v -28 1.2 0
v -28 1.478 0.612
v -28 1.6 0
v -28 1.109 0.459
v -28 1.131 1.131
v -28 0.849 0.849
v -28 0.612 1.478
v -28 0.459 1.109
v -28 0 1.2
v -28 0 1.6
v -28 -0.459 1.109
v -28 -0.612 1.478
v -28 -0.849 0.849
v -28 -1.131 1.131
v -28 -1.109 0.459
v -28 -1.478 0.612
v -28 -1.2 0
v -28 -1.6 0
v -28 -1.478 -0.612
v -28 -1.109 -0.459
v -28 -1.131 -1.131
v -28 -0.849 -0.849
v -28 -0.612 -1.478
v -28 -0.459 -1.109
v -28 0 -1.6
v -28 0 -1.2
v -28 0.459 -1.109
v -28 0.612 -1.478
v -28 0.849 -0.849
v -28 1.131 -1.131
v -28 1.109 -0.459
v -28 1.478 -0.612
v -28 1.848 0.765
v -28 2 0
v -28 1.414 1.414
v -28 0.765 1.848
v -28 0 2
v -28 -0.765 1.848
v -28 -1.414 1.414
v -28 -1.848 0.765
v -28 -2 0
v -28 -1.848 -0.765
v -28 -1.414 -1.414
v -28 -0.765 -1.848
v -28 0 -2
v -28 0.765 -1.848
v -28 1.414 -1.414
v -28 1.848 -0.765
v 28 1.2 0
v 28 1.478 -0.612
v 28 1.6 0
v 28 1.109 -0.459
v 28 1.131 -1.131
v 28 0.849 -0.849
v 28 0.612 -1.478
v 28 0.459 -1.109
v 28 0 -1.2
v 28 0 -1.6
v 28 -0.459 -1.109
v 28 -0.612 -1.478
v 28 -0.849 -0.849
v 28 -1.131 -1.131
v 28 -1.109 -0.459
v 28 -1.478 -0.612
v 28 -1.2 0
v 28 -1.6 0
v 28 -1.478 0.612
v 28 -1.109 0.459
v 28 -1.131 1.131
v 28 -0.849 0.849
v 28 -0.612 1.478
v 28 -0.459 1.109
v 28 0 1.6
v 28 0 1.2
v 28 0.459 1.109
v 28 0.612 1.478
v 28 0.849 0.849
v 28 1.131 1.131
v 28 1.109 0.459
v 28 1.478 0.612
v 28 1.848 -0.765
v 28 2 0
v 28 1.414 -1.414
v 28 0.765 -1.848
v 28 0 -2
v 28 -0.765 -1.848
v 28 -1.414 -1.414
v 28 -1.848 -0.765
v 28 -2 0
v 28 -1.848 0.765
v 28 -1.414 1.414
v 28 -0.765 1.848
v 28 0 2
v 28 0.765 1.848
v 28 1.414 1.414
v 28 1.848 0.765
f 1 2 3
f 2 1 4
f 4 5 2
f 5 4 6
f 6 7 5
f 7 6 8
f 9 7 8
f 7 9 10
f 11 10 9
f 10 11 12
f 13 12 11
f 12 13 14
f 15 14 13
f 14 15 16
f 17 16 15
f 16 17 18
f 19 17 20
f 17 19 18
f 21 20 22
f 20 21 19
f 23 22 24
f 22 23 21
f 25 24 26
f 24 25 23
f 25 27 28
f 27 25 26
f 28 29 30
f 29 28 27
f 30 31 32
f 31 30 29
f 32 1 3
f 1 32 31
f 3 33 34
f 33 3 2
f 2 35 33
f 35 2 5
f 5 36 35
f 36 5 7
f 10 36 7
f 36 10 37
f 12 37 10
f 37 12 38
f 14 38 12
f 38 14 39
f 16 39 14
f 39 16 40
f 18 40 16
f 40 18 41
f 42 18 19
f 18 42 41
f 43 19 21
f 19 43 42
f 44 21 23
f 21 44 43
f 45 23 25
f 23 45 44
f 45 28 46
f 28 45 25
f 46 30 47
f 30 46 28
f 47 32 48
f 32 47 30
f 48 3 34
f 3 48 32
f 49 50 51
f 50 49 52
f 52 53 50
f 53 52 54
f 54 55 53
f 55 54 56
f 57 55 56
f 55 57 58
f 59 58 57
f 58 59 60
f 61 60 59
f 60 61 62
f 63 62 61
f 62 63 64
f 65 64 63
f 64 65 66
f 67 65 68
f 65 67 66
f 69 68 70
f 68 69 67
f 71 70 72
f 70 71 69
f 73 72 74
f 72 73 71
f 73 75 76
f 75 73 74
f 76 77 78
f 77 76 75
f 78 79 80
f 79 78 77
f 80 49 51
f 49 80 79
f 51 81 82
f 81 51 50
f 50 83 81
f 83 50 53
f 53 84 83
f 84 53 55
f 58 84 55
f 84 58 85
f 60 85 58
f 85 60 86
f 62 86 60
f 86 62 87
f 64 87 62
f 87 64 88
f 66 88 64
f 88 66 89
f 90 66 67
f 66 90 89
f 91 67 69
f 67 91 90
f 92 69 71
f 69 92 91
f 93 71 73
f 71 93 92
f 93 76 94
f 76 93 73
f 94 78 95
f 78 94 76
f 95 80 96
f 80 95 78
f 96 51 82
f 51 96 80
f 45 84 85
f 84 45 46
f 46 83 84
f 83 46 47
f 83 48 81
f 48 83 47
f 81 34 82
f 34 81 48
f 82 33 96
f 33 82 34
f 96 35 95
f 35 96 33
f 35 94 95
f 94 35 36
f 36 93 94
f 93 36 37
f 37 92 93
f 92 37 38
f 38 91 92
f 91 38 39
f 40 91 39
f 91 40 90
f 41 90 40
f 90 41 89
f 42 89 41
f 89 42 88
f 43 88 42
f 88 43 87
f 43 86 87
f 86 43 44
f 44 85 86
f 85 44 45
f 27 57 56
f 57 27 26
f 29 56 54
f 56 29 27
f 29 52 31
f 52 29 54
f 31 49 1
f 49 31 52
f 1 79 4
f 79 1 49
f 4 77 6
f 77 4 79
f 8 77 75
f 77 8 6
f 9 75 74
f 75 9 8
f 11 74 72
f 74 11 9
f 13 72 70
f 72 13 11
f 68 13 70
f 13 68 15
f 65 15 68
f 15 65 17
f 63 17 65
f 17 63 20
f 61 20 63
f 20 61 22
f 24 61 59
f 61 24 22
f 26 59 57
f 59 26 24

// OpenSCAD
// file: ../p/4-4disc.scad
use <../lib.scad>
$fa=1; $fs=0.2;
function ldraw_lib__4_4disc(realsolid=false) = [
// 0 Disc 1.0
// 0 Name: 4-4disc.dat
// 0 Author: James Jessiman
// 0 !LDRAW_ORG Primitive UPDATE 2002-02
// 0 !LICENSE Licensed under CC BY 2.0 and CC BY 4.0 : see CAreadme.txt
// 
// 0 BFC CERTIFY CCW
  [0,"BFC","CERTIFY"],
  [0,"BFC","CCW"],
// 
// 0 !HISTORY 1998-12-15 [PTadmin] Official Update 1998-10
// 0 !HISTORY 2002-03-23 [sbliss] Added BFC statement
// 0 !HISTORY 2002-04-25 [PTadmin] Official Update 2002-02
// 0 !HISTORY 2007-06-24 [PTadmin] Header formatted for Contributor Agreement
// 0 !HISTORY 2008-07-01 [PTadmin] Official Update 2008-01
// 
// 
// 3 16 0 0 0 1 0 0 0.9239 0 0.3827
  [3,16,0,0,0,1,0,0,0.9239,0,0.3827],
// 3 16 0 0 0 0.9239 0 0.3827 0.7071 0 0.7071
  [3,16,0,0,0,0.9239,0,0.3827,0.7071,0,0.7071],
// 3 16 0 0 0 0.7071 0 0.7071 0.3827 0 0.9239
  [3,16,0,0,0,0.7071,0,0.7071,0.3827,0,0.9239],
// 3 16 0 0 0 0.3827 0 0.9239 0 0 1
  [3,16,0,0,0,0.3827,0,0.9239,0,0,1],
// 3 16 0 0 0 0 0 1 -0.3827 0 0.9239
  [3,16,0,0,0,0,0,1,-0.3827,0,0.9239],
// 3 16 0 0 0 -0.3827 0 0.9239 -0.7071 0 0.7071
  [3,16,0,0,0,-0.3827,0,0.9239,-0.7071,0,0.7071],
// 3 16 0 0 0 -0.7071 0 0.7071 -0.9239 0 0.3827
  [3,16,0,0,0,-0.7071,0,0.7071,-0.9239,0,0.3827],
// 3 16 0 0 0 -0.9239 0 0.3827 -1 0 -0
  [3,16,0,0,0,-0.9239,0,0.3827,-1,0,-0],
// 3 16 0 0 0 -1 0 -0 -0.9239 0 -0.3827
  [3,16,0,0,0,-1,0,-0,-0.9239,0,-0.3827],
// 3 16 0 0 0 -0.9239 0 -0.3827 -0.7071 0 -0.7071
  [3,16,0,0,0,-0.9239,0,-0.3827,-0.7071,0,-0.7071],
// 3 16 0 0 0 -0.7071 0 -0.7071 -0.3827 0 -0.9239
  [3,16,0,0,0,-0.7071,0,-0.7071,-0.3827,0,-0.9239],
// 3 16 0 0 0 -0.3827 0 -0.9239 0 0 -1
  [3,16,0,0,0,-0.3827,0,-0.9239,0,0,-1],
// 3 16 0 0 0 0 0 -1 0.3827 0 -0.9239
  [3,16,0,0,0,0,0,-1,0.3827,0,-0.9239],
// 3 16 0 0 0 0.3827 0 -0.9239 0.7071 0 -0.7071
  [3,16,0,0,0,0.3827,0,-0.9239,0.7071,0,-0.7071],
// 3 16 0 0 0 0.7071 0 -0.7071 0.9239 0 -0.3827
  [3,16,0,0,0,0.7071,0,-0.7071,0.9239,0,-0.3827],
// 3 16 0 0 0 0.9239 0 -0.3827 1 0 0
  [3,16,0,0,0,0.9239,0,-0.3827,1,0,0],
// 0
];
module ldraw_lib__4_4disc(step=0, col=false, unit=2/5, alt=false, line=0.2, solid=!$preview)
    makepoly(ldraw_lib__4_4disc(solid), step=step, col=col, unit=unit, alt=alt, line=line, solid=solid);
ldraw_lib__4_4disc(line=0.2);
// file: ../p/stud3.scad
use <../lib.scad>
use <4-4cyli.scad>
use <4-4disc.scad>
use <4-4edge.scad>
$fa=1; $fs=0.2;
function ldraw_lib__stud3(realsolid=false) = realsolid ? 
    [openscad(translate([0,0,-eps()], o=cylinder(4+eps(), r=4)),2)] : [
// 0 Stud Tube Solid
// 0 Name: stud3.dat
// 0 Author: James Jessiman
// 0 !LDRAW_ORG Primitive UPDATE 2012-01
// 0 !LICENSE Licensed under CC BY 2.0 and CC BY 4.0 : see CAreadme.txt
// 
// 0 BFC CERTIFY CCW
  [0,"BFC","CERTIFY"],
  [0,"BFC","CCW"],
// 
// 0 !HISTORY 2002-04-04 [sbliss] Modified for BFC compliance
// 0 !HISTORY 2002-04-25 [PTadmin] Official Update 2002-02
// 0 !HISTORY 2007-06-24 [PTadmin] Header formatted for Contributor Agreement
// 0 !HISTORY 2008-07-01 [PTadmin] Official Update 2008-01
// 0 !HISTORY 2012-02-16 [Philo] Changed to CCW
// 0 !HISTORY 2012-03-30 [PTadmin] Official Update 2012-01
// 
// 
// 1 16 0 -4 0 4 0 0 0 1 0 0 0 4 4-4edge.dat
  [1,16,0,-4,0,4,0,0,0,1,0,0,0,4, ldraw_lib__4_4edge(realsolid)],
// 1 16 0 0 0 4 0 0 0 1 0 0 0 4 4-4edge.dat
  [1,16,0,0,0,4,0,0,0,1,0,0,0,4, ldraw_lib__4_4edge(realsolid)],
// 1 16 0 -4 0 4 0 0 0 1 0 0 0 4 4-4disc.dat
  [1,16,0,-4,0,4,0,0,0,1,0,0,0,4, ldraw_lib__4_4disc(realsolid)],
// 1 16 0 -4 0 4 0 0 0 4 0 0 0 4 4-4cyli.dat
  [1,16,0,-4,0,4,0,0,0,4,0,0,0,4, ldraw_lib__4_4cyli(realsolid)],
];
module ldraw_lib__stud3(step=0, col=false, unit=2/5, alt=false, line=0.2, solid=!$preview)
    makepoly(ldraw_lib__stud3(solid), step=step, col=col, unit=unit, alt=alt, line=line, solid=solid);
ldraw_lib__stud3(line=0.2);
// file: ../p/stud.scad
use <../lib.scad>
use <4-4cyli.scad>
use <4-4disc.scad>
use <4-4edge.scad>
$fa=1; $fs=0.2;
function ldraw_lib__stud(realsolid=false) = realsolid ? 
    [openscad(translate([0,0,-eps()], o=cylinder(4+eps(), r=6)),2)] : [
// 0 Stud
// 0 Name: stud.dat
// 0 Author: James Jessiman
// 0 !LDRAW_ORG Primitive UPDATE 2012-01
// 0 !LICENSE Licensed under CC BY 2.0 and CC BY 4.0 : see CAreadme.txt
// 
// 0 BFC CERTIFY CCW
  [0,"BFC","CERTIFY"],
  [0,"BFC","CCW"],
// 
// 0 !HISTORY 2002-04-04 [sbliss] Modified for BFC compliance
// 0 !HISTORY 2002-04-25 [PTadmin] Official Update 2002-02
// 0 !HISTORY 2007-06-24 [PTadmin] Header formatted for Contributor Agreement
// 0 !HISTORY 2008-07-01 [PTadmin] Official Update 2008-01
// 0 !HISTORY 2012-02-16 [Philo] Changed to CCW
// 0 !HISTORY 2012-03-30 [PTadmin] Official Update 2012-01
// 
// 
// 1 16 0 0 0 6 0 0 0 1 0 0 0 6 4-4edge.dat
  [1,16,0,0,0,6,0,0,0,1,0,0,0,6, ldraw_lib__4_4edge(realsolid)],
// 1 16 0 -4 0 6 0 0 0 1 0 0 0 6 4-4edge.dat
  [1,16,0,-4,0,6,0,0,0,1,0,0,0,6, ldraw_lib__4_4edge(realsolid)],
// 1 16 0 0 0 6 0 0 0 -4 0 0 0 6 4-4cyli.dat
  [1,16,0,0,0,6,0,0,0,-4,0,0,0,6, ldraw_lib__4_4cyli(realsolid)],
// 1 16 0 -4 0 6 0 0 0 1 0 0 0 6 4-4disc.dat
  [1,16,0,-4,0,6,0,0,0,1,0,0,0,6, ldraw_lib__4_4disc(realsolid)],
];
module ldraw_lib__stud(step=0, col=false, unit=2/5, alt=false, line=0.2, solid=!$preview)
    makepoly(ldraw_lib__stud(solid), step=step, col=col, unit=unit, alt=alt, line=line, solid=solid);
ldraw_lib__stud(line=0.2);
// file: ../p/box5.scad
use <../lib.scad>
$fa=1; $fs=0.2;
function ldraw_lib__box5(realsolid=false) = [
// 0 Box with 5 Faces and All Edges
// 0 Name: box5.dat
// 0 Author: James Jessiman
// 0 !LDRAW_ORG Primitive UPDATE 2012-01
// 0 !LICENSE Licensed under CC BY 2.0 and CC BY 4.0 : see CAreadme.txt
// 
// 0 BFC CERTIFY CCW
  [0,"BFC","CERTIFY"],
  [0,"BFC","CCW"],
// 
// 0 !HISTORY 2002-04-03 [sbliss] Modified for BFC compliance
// 0 !HISTORY 2002-04-25 [PTadmin] Official Update 2002-02
// 0 !HISTORY 2007-06-24 [PTadmin] Header formatted for Contributor Agreement
// 0 !HISTORY 2008-07-01 [PTadmin] Official Update 2008-01
// 0 !HISTORY 2012-02-16 [Philo] Changed to CCW
// 0 !HISTORY 2012-03-30 [PTadmin] Official Update 2012-01
// 
// 
// 2 24 1 1 1 -1 1 1
  [2,24,1,1,1,-1,1,1],
// 2 24 -1 1 1 -1 1 -1
  [2,24,-1,1,1,-1,1,-1],
// 2 24 -1 1 -1 1 1 -1
  [2,24,-1,1,-1,1,1,-1],
// 2 24 1 1 -1 1 1 1
  [2,24,1,1,-1,1,1,1],
// 2 24 1 0 1 -1 0 1
  [2,24,1,0,1,-1,0,1],
// 2 24 -1 0 1 -1 0 -1
  [2,24,-1,0,1,-1,0,-1],
// 2 24 -1 0 -1 1 0 -1
  [2,24,-1,0,-1,1,0,-1],
// 2 24 1 0 -1 1 0 1
  [2,24,1,0,-1,1,0,1],
// 2 24 1 0 1 1 1 1
  [2,24,1,0,1,1,1,1],
// 2 24 -1 0 1 -1 1 1
  [2,24,-1,0,1,-1,1,1],
// 2 24 1 0 -1 1 1 -1
  [2,24,1,0,-1,1,1,-1],
// 2 24 -1 0 -1 -1 1 -1
  [2,24,-1,0,-1,-1,1,-1],
// 4 16 -1 1 1 1 1 1 1 1 -1 -1 1 -1
  [4,16,-1,1,1,1,1,1,1,1,-1,-1,1,-1],
// 4 16 -1 1 1 -1 0 1 1 0 1 1 1 1
  [4,16,-1,1,1,-1,0,1,1,0,1,1,1,1],
// 4 16 -1 1 -1 -1 0 -1 -1 0 1 -1 1 1
  [4,16,-1,1,-1,-1,0,-1,-1,0,1,-1,1,1],
// 4 16 1 1 -1 1 0 -1 -1 0 -1 -1 1 -1
  [4,16,1,1,-1,1,0,-1,-1,0,-1,-1,1,-1],
// 4 16 1 1 1 1 0 1 1 0 -1 1 1 -1
  [4,16,1,1,1,1,0,1,1,0,-1,1,1,-1],
];
module ldraw_lib__box5(step=0, col=false, unit=2/5, alt=false, line=0.2, solid=!$preview)
    makepoly(ldraw_lib__box5(solid), step=step, col=col, unit=unit, alt=alt, line=line, solid=solid);
ldraw_lib__box5(line=0.2);
// file: ../p/box4t.scad
use <../lib.scad>
$fa=1; $fs=0.2;
function ldraw_lib__box4t(realsolid=false) = [
// 0 Box with 4 Adjacent Faces and All Edges
// 0 Name: box4t.dat
// 0 Author: Tore Eriksson [Tore_Eriksson]
// 0 !LDRAW_ORG Primitive UPDATE 2003-02
// 0 !LICENSE Licensed under CC BY 2.0 and CC BY 4.0 : see CAreadme.txt
// 
// 0 BFC CERTIFY CCW
  [0,"BFC","CERTIFY"],
  [0,"BFC","CCW"],
// 
// 0 !HISTORY 1997-09-29 [PTadmin] Official Update 1997-15
// 0 !HISTORY 2002-08-31 [izanette] Modified with WINDZ for BFC compliance
// 0 !HISTORY 2003-08-01 [PTadmin] Official Update 2003-02
// 0 !HISTORY 2007-06-24 [PTadmin] Header formatted for Contributor Agreement
// 0 !HISTORY 2008-07-01 [PTadmin] Official Update 2008-01
// 
// 
// 2 24 1 1 1 -1 1 1
  [2,24,1,1,1,-1,1,1],
// 2 24 -1 1 1 -1 1 -1
  [2,24,-1,1,1,-1,1,-1],
// 2 24 -1 1 -1 1 1 -1
  [2,24,-1,1,-1,1,1,-1],
// 2 24 1 1 -1 1 1 1
  [2,24,1,1,-1,1,1,1],
// 2 24 1 0 1 -1 0 1
  [2,24,1,0,1,-1,0,1],
// 2 24 -1 0 1 -1 0 -1
  [2,24,-1,0,1,-1,0,-1],
// 2 24 -1 0 -1 1 0 -1
  [2,24,-1,0,-1,1,0,-1],
// 2 24 1 0 -1 1 0 1
  [2,24,1,0,-1,1,0,1],
// 2 24 1 0 1 1 1 1
  [2,24,1,0,1,1,1,1],
// 2 24 -1 0 1 -1 1 1
  [2,24,-1,0,1,-1,1,1],
// 2 24 1 0 -1 1 1 -1
  [2,24,1,0,-1,1,1,-1],
// 2 24 -1 0 -1 -1 1 -1
  [2,24,-1,0,-1,-1,1,-1],
// 4 16 1 1 1 1 1 -1 -1 1 -1 -1 1 1
  [4,16,1,1,1,1,1,-1,-1,1,-1,-1,1,1],
// 4 16 1 1 1 -1 1 1 -1 0 1 1 0 1
  [4,16,1,1,1,-1,1,1,-1,0,1,1,0,1],
// 4 16 -1 1 1 -1 1 -1 -1 0 -1 -1 0 1
  [4,16,-1,1,1,-1,1,-1,-1,0,-1,-1,0,1],
// 0 4 16 -1 1 -1 -1 0 -1 1 0 -1 1 1 -1
// 4 16 1 1 -1 1 1 1 1 0 1 1 0 -1
  [4,16,1,1,-1,1,1,1,1,0,1,1,0,-1],
// 0
];
module ldraw_lib__box4t(step=0, col=false, unit=2/5, alt=false, line=0.2, solid=!$preview)
    makepoly(ldraw_lib__box4t(solid), step=step, col=col, unit=unit, alt=alt, line=line, solid=solid);
ldraw_lib__box4t(line=0.2);
// file: s/3004s01.scad
use <../../lib.scad>
use <../../p/box4t.scad>
use <../../p/box5.scad>
use <../../p/stud.scad>
use <../../p/stud3.scad>
$fa=1; $fs=0.2;
function ldraw_lib__s__3004s01(realsolid=false) = [
// 0 ~Brick  1 x  2 without Front Face
// 0 Name: s\3004s01.dat
// 0 Author: James Jessiman
// 0 !LDRAW_ORG Subpart UPDATE 2003-03
// 0 !LICENSE Licensed under CC BY 2.0 and CC BY 4.0 : see CAreadme.txt
// 
// 0 BFC CERTIFY CCW
  [0,"BFC","CERTIFY"],
  [0,"BFC","CCW"],
// 
// 0 !HISTORY 2003-09-07 [jriley] Subfiling, BFC
// 0 !HISTORY 2003-12-19 [PTadmin] Official Update 2003-03
// 0 !HISTORY 2007-08-29 [PTadmin] Header formatted for Contributor Agreement
// 0 !HISTORY 2008-07-01 [PTadmin] Official Update 2008-01
// 
// 
// 1 16 0 4 0 1 0 0 0 -5 0 0 0 1 stud3.dat
  [1,16,0,4,0,1,0,0,0,-5,0,0,0,1, ldraw_lib__stud3(realsolid)],
// 0 BFC INVERTNEXT
  [0,"BFC","INVERTNEXT"],
// 1 16 0 24 0 16 0 0 0 -20 0 0 0 6 box5.dat
  [1,16,0,24,0,16,0,0,0,-20,0,0,0,6, ldraw_lib__box5(realsolid)],
// 4 16 20 24 10 16 24 6 -16 24 6 -20 24 10
  [4,16,20,24,10,16,24,6,-16,24,6,-20,24,10],
// 4 16 -20 24 10 -16 24 6 -16 24 -6 -20 24 -10
  [4,16,-20,24,10,-16,24,6,-16,24,-6,-20,24,-10],
// 4 16 -20 24 -10 -16 24 -6 16 24 -6 20 24 -10
  [4,16,-20,24,-10,-16,24,-6,16,24,-6,20,24,-10],
// 4 16 20 24 -10 16 24 -6 16 24 6 20 24 10
  [4,16,20,24,-10,16,24,-6,16,24,6,20,24,10],
// 1 16 0 24 0 20 0 0 0 -24 0 0 0 10 box4t.dat
  [1,16,0,24,0,20,0,0,0,-24,0,0,0,10, ldraw_lib__box4t(realsolid)],
// 1 16 10 0 0 1 0 0 0 1 0 0 0 1 stud.dat
  [1,16,10,0,0,1,0,0,0,1,0,0,0,1, ldraw_lib__stud(realsolid)],
// 1 16 -10 0 0 1 0 0 0 1 0 0 0 1 stud.dat
  [1,16,-10,0,0,1,0,0,0,1,0,0,0,1, ldraw_lib__stud(realsolid)],
// 0
];
module ldraw_lib__s__3004s01(step=0, col=false, unit=2/5, alt=false, line=0.2, solid=!$preview)
    makepoly(ldraw_lib__s__3004s01(solid), step=step, col=col, unit=unit, alt=alt, line=line, solid=solid);
ldraw_lib__s__3004s01(line=0.2);
// file: ../p/4-4cyli.scad
use <../lib.scad>
$fa=1; $fs=0.2;
function ldraw_lib__4_4cyli(realsolid=false) = [
// 0 Cylinder 1.0
// 0 Name: 4-4cyli.dat
// 0 Author: James Jessiman
// 0 !LDRAW_ORG Primitive UPDATE 2005-01
// 0 !LICENSE Licensed under CC BY 2.0 and CC BY 4.0 : see CAreadme.txt
// 
// 0 BFC CERTIFY CCW
  [0,"BFC","CERTIFY"],
  [0,"BFC","CCW"],
// 
// 0 !HISTORY 1998-12-15 [PTadmin] Official Update 1998-10
// 0 !HISTORY 2002-03-23 [sbliss] Added BFC statement; merged headers from files in distributions LDraw 0.27 and Complete.
// 0 !HISTORY 2002-04-25 [PTadmin] Official Update 2002-02
// 0 !HISTORY 2004-12-14 [guyvivan] BFC CCW
// 0 !HISTORY 2005-12-28 [PTadmin] Official Update 2005-01
// 0 !HISTORY 2007-06-24 [PTadmin] Header formatted for Contributor Agreement
// 0 !HISTORY 2008-07-01 [PTadmin] Official Update 2008-01
// 
// 
// 4 16 1 1 0 0.9239 1 0.3827 0.9239 0 0.3827 1 0 0
  [4,16,1,1,0,0.9239,1,0.3827,0.9239,0,0.3827,1,0,0],
// 5 24 1 0 0 1 1 0 0.9239 0 0.3827 0.9239 0 -0.3827
  [5,24,1,0,0,1,1,0,0.9239,0,0.3827,0.9239,0,-0.3827],
// 4 16 0.9239 1 0.3827 0.7071 1 0.7071 0.7071 0 0.7071 0.9239 0 0.3827
  [4,16,0.9239,1,0.3827,0.7071,1,0.7071,0.7071,0,0.7071,0.9239,0,0.3827],
// 5 24 0.9239 0 0.3827 0.9239 1 0.3827 0.7071 0 0.7071 1 0 0
  [5,24,0.9239,0,0.3827,0.9239,1,0.3827,0.7071,0,0.7071,1,0,0],
// 4 16 0.7071 1 0.7071 0.3827 1 0.9239 0.3827 0 0.9239 0.7071 0 0.7071
  [4,16,0.7071,1,0.7071,0.3827,1,0.9239,0.3827,0,0.9239,0.7071,0,0.7071],
// 5 24 0.7071 0 0.7071 0.7071 1 0.7071 0.3827 0 0.9239 0.9239 0 0.3827
  [5,24,0.7071,0,0.7071,0.7071,1,0.7071,0.3827,0,0.9239,0.9239,0,0.3827],
// 4 16 0.3827 1 0.9239 0 1 1 0 0 1 0.3827 0 0.9239
  [4,16,0.3827,1,0.9239,0,1,1,0,0,1,0.3827,0,0.9239],
// 5 24 0.3827 0 0.9239 0.3827 1 0.9239 0 0 1 0.7071 0 0.7071
  [5,24,0.3827,0,0.9239,0.3827,1,0.9239,0,0,1,0.7071,0,0.7071],
// 4 16 0 1 1 -0.3827 1 0.9239 -0.3827 0 0.9239 0 0 1
  [4,16,0,1,1,-0.3827,1,0.9239,-0.3827,0,0.9239,0,0,1],
// 5 24 0 0 1 0 1 1 -0.3827 0 0.9239 0.3827 0 0.9239
  [5,24,0,0,1,0,1,1,-0.3827,0,0.9239,0.3827,0,0.9239],
// 4 16 -0.3827 1 0.9239 -0.7071 1 0.7071 -0.7071 0 0.7071 -0.3827 0 0.9239
  [4,16,-0.3827,1,0.9239,-0.7071,1,0.7071,-0.7071,0,0.7071,-0.3827,0,0.9239],
// 5 24 -0.3827 0 0.9239 -0.3827 1 0.9239 -0.7071 0 0.7071 0 0 1
  [5,24,-0.3827,0,0.9239,-0.3827,1,0.9239,-0.7071,0,0.7071,0,0,1],
// 4 16 -0.7071 1 0.7071 -0.9239 1 0.3827 -0.9239 0 0.3827 -0.7071 0 0.7071
  [4,16,-0.7071,1,0.7071,-0.9239,1,0.3827,-0.9239,0,0.3827,-0.7071,0,0.7071],
// 5 24 -0.7071 0 0.7071 -0.7071 1 0.7071 -0.9239 0 0.3827 -0.3827 0 0.9239
  [5,24,-0.7071,0,0.7071,-0.7071,1,0.7071,-0.9239,0,0.3827,-0.3827,0,0.9239],
// 4 16 -0.9239 1 0.3827 -1 1 0 -1 0 0 -0.9239 0 0.3827
  [4,16,-0.9239,1,0.3827,-1,1,0,-1,0,0,-0.9239,0,0.3827],
// 5 24 -0.9239 0 0.3827 -0.9239 1 0.3827 -1 0 0 -0.7071 0 0.7071
  [5,24,-0.9239,0,0.3827,-0.9239,1,0.3827,-1,0,0,-0.7071,0,0.7071],
// 4 16 -1 1 0 -0.9239 1 -0.3827 -0.9239 0 -0.3827 -1 0 0
  [4,16,-1,1,0,-0.9239,1,-0.3827,-0.9239,0,-0.3827,-1,0,0],
// 5 24 -1 0 0 -1 1 0 -0.9239 0 -0.3827 -0.9239 0 0.3827
  [5,24,-1,0,0,-1,1,0,-0.9239,0,-0.3827,-0.9239,0,0.3827],
// 4 16 -0.9239 1 -0.3827 -0.7071 1 -0.7071 -0.7071 0 -0.7071 -0.9239 0 -0.3827
  [4,16,-0.9239,1,-0.3827,-0.7071,1,-0.7071,-0.7071,0,-0.7071,-0.9239,0,-0.3827],
// 5 24 -0.9239 0 -0.3827 -0.9239 1 -0.3827 -0.7071 0 -0.7071 -1 0 0
  [5,24,-0.9239,0,-0.3827,-0.9239,1,-0.3827,-0.7071,0,-0.7071,-1,0,0],
// 4 16 -0.7071 1 -0.7071 -0.3827 1 -0.9239 -0.3827 0 -0.9239 -0.7071 0 -0.7071
  [4,16,-0.7071,1,-0.7071,-0.3827,1,-0.9239,-0.3827,0,-0.9239,-0.7071,0,-0.7071],
// 5 24 -0.7071 0 -0.7071 -0.7071 1 -0.7071 -0.3827 0 -0.9239 -0.9239 0 -0.3827
  [5,24,-0.7071,0,-0.7071,-0.7071,1,-0.7071,-0.3827,0,-0.9239,-0.9239,0,-0.3827],
// 4 16 -0.3827 1 -0.9239 0 1 -1 0 0 -1 -0.3827 0 -0.9239
  [4,16,-0.3827,1,-0.9239,0,1,-1,0,0,-1,-0.3827,0,-0.9239],
// 5 24 -0.3827 0 -0.9239 -0.3827 1 -0.9239 0 0 -1 -0.7071 0 -0.7071
  [5,24,-0.3827,0,-0.9239,-0.3827,1,-0.9239,0,0,-1,-0.7071,0,-0.7071],
// 4 16 0 1 -1 0.3827 1 -0.9239 0.3827 0 -0.9239 0 0 -1
  [4,16,0,1,-1,0.3827,1,-0.9239,0.3827,0,-0.9239,0,0,-1],
// 5 24 0 0 -1 0 1 -1 0.3827 0 -0.9239 -0.3827 0 -0.9239
  [5,24,0,0,-1,0,1,-1,0.3827,0,-0.9239,-0.3827,0,-0.9239],
// 4 16 0.3827 1 -0.9239 0.7071 1 -0.7071 0.7071 0 -0.7071 0.3827 0 -0.9239
  [4,16,0.3827,1,-0.9239,0.7071,1,-0.7071,0.7071,0,-0.7071,0.3827,0,-0.9239],
// 5 24 0.3827 0 -0.9239 0.3827 1 -0.9239 0.7071 0 -0.7071 0 0 -1
  [5,24,0.3827,0,-0.9239,0.3827,1,-0.9239,0.7071,0,-0.7071,0,0,-1],
// 4 16 0.7071 1 -0.7071 0.9239 1 -0.3827 0.9239 0 -0.3827 0.7071 0 -0.7071
  [4,16,0.7071,1,-0.7071,0.9239,1,-0.3827,0.9239,0,-0.3827,0.7071,0,-0.7071],
// 5 24 0.7071 0 -0.7071 0.7071 1 -0.7071 0.9239 0 -0.3827 0.3827 0 -0.9239
  [5,24,0.7071,0,-0.7071,0.7071,1,-0.7071,0.9239,0,-0.3827,0.3827,0,-0.9239],
// 4 16 0.9239 1 -0.3827 1 1 0 1 0 0 0.9239 0 -0.3827
  [4,16,0.9239,1,-0.3827,1,1,0,1,0,0,0.9239,0,-0.3827],
// 5 24 0.9239 0 -0.3827 0.9239 1 -0.3827 1 0 0 0.7071 0 -0.7071
  [5,24,0.9239,0,-0.3827,0.9239,1,-0.3827,1,0,0,0.7071,0,-0.7071],
// 0
];
module ldraw_lib__4_4cyli(step=0, col=false, unit=2/5, alt=false, line=0.2, solid=!$preview)
    makepoly(ldraw_lib__4_4cyli(solid), step=step, col=col, unit=unit, alt=alt, line=line, solid=solid);
ldraw_lib__4_4cyli(line=0.2);
// file: ../p/4-4ring4.scad
use <../lib.scad>
$fa=1; $fs=0.2;
function ldraw_lib__4_4ring4(realsolid=false) = [
// 0 Ring  4 x 1.0
// 0 Name: 4-4ring4.dat
// 0 Author: James Jessiman
// 0 !LDRAW_ORG Primitive UPDATE 2009-01
// 0 !LICENSE Licensed under CC BY 2.0 and CC BY 4.0 : see CAreadme.txt
// 
// 0 BFC CERTIFY CCW
  [0,"BFC","CERTIFY"],
  [0,"BFC","CCW"],
// 
// 0 !HISTORY 1998-12-15 [PTadmin] Official Update 1998-10
// 0 !HISTORY 2002-04-08 [BrickCaster] Modified for BFC compliance
// 0 !HISTORY 2002-04-25 [PTadmin] Official Update 2002-02
// 0 !HISTORY 2007-06-24 [PTadmin] Header formatted for Contributor Agreement
// 0 !HISTORY 2008-07-01 [PTadmin] Official Update 2008-01
// 0 !HISTORY 2008-08-26 [cwdee] Switch polygon winding and rename
// 0 !HISTORY 2009-05-02 [PTadmin] Official Update 2009-01
// 
// 
// 4 16 -1.9135 0 4.6195 -1.5308 0 3.6956 0 0 4 0 0 5
  [4,16,-1.9135,0,4.6195,-1.5308,0,3.6956,0,0,4,0,0,5],
// 4 16 -3.5355 0 3.5355 -2.8284 0 2.8284 -1.5308 0 3.6956 -1.9135 0 4.6195
  [4,16,-3.5355,0,3.5355,-2.8284,0,2.8284,-1.5308,0,3.6956,-1.9135,0,4.6195],
// 4 16 -4.6195 0 1.9135 -3.6956 0 1.5308 -2.8284 0 2.8284 -3.5355 0 3.5355
  [4,16,-4.6195,0,1.9135,-3.6956,0,1.5308,-2.8284,0,2.8284,-3.5355,0,3.5355],
// 4 16 -5 0 0 -4 0 0 -3.6956 0 1.5308 -4.6195 0 1.9135
  [4,16,-5,0,0,-4,0,0,-3.6956,0,1.5308,-4.6195,0,1.9135],
// 4 16 -4.6195 0 -1.9135 -3.6956 0 -1.5308 -4 0 0 -5 0 0
  [4,16,-4.6195,0,-1.9135,-3.6956,0,-1.5308,-4,0,0,-5,0,0],
// 4 16 -3.5355 0 -3.5355 -2.8284 0 -2.8284 -3.6956 0 -1.5308 -4.6195 0 -1.9135
  [4,16,-3.5355,0,-3.5355,-2.8284,0,-2.8284,-3.6956,0,-1.5308,-4.6195,0,-1.9135],
// 4 16 -1.9135 0 -4.6195 -1.5308 0 -3.6956 -2.8284 0 -2.8284 -3.5355 0 -3.5355
  [4,16,-1.9135,0,-4.6195,-1.5308,0,-3.6956,-2.8284,0,-2.8284,-3.5355,0,-3.5355],
// 4 16 0 0 -5 0 0 -4 -1.5308 0 -3.6956 -1.9135 0 -4.6195
  [4,16,0,0,-5,0,0,-4,-1.5308,0,-3.6956,-1.9135,0,-4.6195],
// 4 16 1.9135 0 -4.6195 1.5308 0 -3.6956 0 0 -4 0 0 -5
  [4,16,1.9135,0,-4.6195,1.5308,0,-3.6956,0,0,-4,0,0,-5],
// 4 16 3.5355 0 -3.5355 2.8284 0 -2.8284 1.5308 0 -3.6956 1.9135 0 -4.6195
  [4,16,3.5355,0,-3.5355,2.8284,0,-2.8284,1.5308,0,-3.6956,1.9135,0,-4.6195],
// 4 16 4.6195 0 -1.9135 3.6956 0 -1.5308 2.8284 0 -2.8284 3.5355 0 -3.5355
  [4,16,4.6195,0,-1.9135,3.6956,0,-1.5308,2.8284,0,-2.8284,3.5355,0,-3.5355],
// 4 16 5 0 0 4 0 0 3.6956 0 -1.5308 4.6195 0 -1.9135
  [4,16,5,0,0,4,0,0,3.6956,0,-1.5308,4.6195,0,-1.9135],
// 4 16 4.6195 0 1.9135 3.6956 0 1.5308 4 0 0 5 0 0
  [4,16,4.6195,0,1.9135,3.6956,0,1.5308,4,0,0,5,0,0],
// 4 16 3.5355 0 3.5355 2.8284 0 2.8284 3.6956 0 1.5308 4.6195 0 1.9135
  [4,16,3.5355,0,3.5355,2.8284,0,2.8284,3.6956,0,1.5308,4.6195,0,1.9135],
// 4 16 1.9135 0 4.6195 1.5308 0 3.6956 2.8284 0 2.8284 3.5355 0 3.5355
  [4,16,1.9135,0,4.6195,1.5308,0,3.6956,2.8284,0,2.8284,3.5355,0,3.5355],
// 4 16 0 0 5 0 0 4 1.5308 0 3.6956 1.9135 0 4.6195
  [4,16,0,0,5,0,0,4,1.5308,0,3.6956,1.9135,0,4.6195],
// 0
];
module ldraw_lib__4_4ring4(step=0, col=false, unit=2/5, alt=false, line=0.2, solid=!$preview)
    makepoly(ldraw_lib__4_4ring4(solid), step=step, col=col, unit=unit, alt=alt, line=line, solid=solid);
ldraw_lib__4_4ring4(line=0.2);
// file: ../p/4-4ring3.scad
use <../lib.scad>
$fa=1; $fs=0.2;
function ldraw_lib__4_4ring3(realsolid=false) = [
// 0 Ring  3 x 1.0
// 0 Name: 4-4ring3.dat
// 0 Author: James Jessiman
// 0 !LDRAW_ORG Primitive UPDATE 2009-01
// 0 !LICENSE Licensed under CC BY 2.0 and CC BY 4.0 : see CAreadme.txt
// 
// 0 BFC CERTIFY CCW
  [0,"BFC","CERTIFY"],
  [0,"BFC","CCW"],
// 
// 0 !HISTORY 1998-12-15 [PTadmin] Official Update 1998-10
// 0 !HISTORY 2002-04-05 [hafhead] Added BFC statement
// 0 !HISTORY 2002-04-25 [PTadmin] Official Update 2002-02
// 0 !HISTORY 2007-06-24 [PTadmin] Header formatted for Contributor Agreement
// 0 !HISTORY 2008-07-01 [PTadmin] Official Update 2008-01
// 0 !HISTORY 2008-08-26 [cwdee] Switch polygon winding and rename
// 0 !HISTORY 2009-05-02 [PTadmin] Official Update 2009-01
// 
// 
// 4 16 -1.5308 0 3.6956 -1.1481 0 2.7717 0 0 3 0 0 4
  [4,16,-1.5308,0,3.6956,-1.1481,0,2.7717,0,0,3,0,0,4],
// 4 16 -2.8284 0 2.8284 -2.1213 0 2.1213 -1.1481 0 2.7717 -1.5308 0 3.6956
  [4,16,-2.8284,0,2.8284,-2.1213,0,2.1213,-1.1481,0,2.7717,-1.5308,0,3.6956],
// 4 16 -3.6956 0 1.5308 -2.7717 0 1.1481 -2.1213 0 2.1213 -2.8284 0 2.8284
  [4,16,-3.6956,0,1.5308,-2.7717,0,1.1481,-2.1213,0,2.1213,-2.8284,0,2.8284],
// 4 16 -4 0 0 -3 0 0 -2.7717 0 1.1481 -3.6956 0 1.5308
  [4,16,-4,0,0,-3,0,0,-2.7717,0,1.1481,-3.6956,0,1.5308],
// 4 16 -3.6956 0 -1.5308 -2.7717 0 -1.1481 -3 0 0 -4 0 0
  [4,16,-3.6956,0,-1.5308,-2.7717,0,-1.1481,-3,0,0,-4,0,0],
// 4 16 -2.8284 0 -2.8284 -2.1213 0 -2.1213 -2.7717 0 -1.1481 -3.6956 0 -1.5308
  [4,16,-2.8284,0,-2.8284,-2.1213,0,-2.1213,-2.7717,0,-1.1481,-3.6956,0,-1.5308],
// 4 16 -1.5308 0 -3.6956 -1.1481 0 -2.7717 -2.1213 0 -2.1213 -2.8284 0 -2.8284
  [4,16,-1.5308,0,-3.6956,-1.1481,0,-2.7717,-2.1213,0,-2.1213,-2.8284,0,-2.8284],
// 4 16 0 0 -4 0 0 -3 -1.1481 0 -2.7717 -1.5308 0 -3.6956
  [4,16,0,0,-4,0,0,-3,-1.1481,0,-2.7717,-1.5308,0,-3.6956],
// 4 16 1.5308 0 -3.6956 1.1481 0 -2.7717 0 0 -3 0 0 -4
  [4,16,1.5308,0,-3.6956,1.1481,0,-2.7717,0,0,-3,0,0,-4],
// 4 16 2.8284 0 -2.8284 2.1213 0 -2.1213 1.1481 0 -2.7717 1.5308 0 -3.6956
  [4,16,2.8284,0,-2.8284,2.1213,0,-2.1213,1.1481,0,-2.7717,1.5308,0,-3.6956],
// 4 16 3.6956 0 -1.5308 2.7717 0 -1.1481 2.1213 0 -2.1213 2.8284 0 -2.8284
  [4,16,3.6956,0,-1.5308,2.7717,0,-1.1481,2.1213,0,-2.1213,2.8284,0,-2.8284],
// 4 16 4 0 0 3 0 0 2.7717 0 -1.1481 3.6956 0 -1.5308
  [4,16,4,0,0,3,0,0,2.7717,0,-1.1481,3.6956,0,-1.5308],
// 4 16 3.6956 0 1.5308 2.7717 0 1.1481 3 0 0 4 0 0
  [4,16,3.6956,0,1.5308,2.7717,0,1.1481,3,0,0,4,0,0],
// 4 16 2.8284 0 2.8284 2.1213 0 2.1213 2.7717 0 1.1481 3.6956 0 1.5308
  [4,16,2.8284,0,2.8284,2.1213,0,2.1213,2.7717,0,1.1481,3.6956,0,1.5308],
// 4 16 1.5308 0 3.6956 1.1481 0 2.7717 2.1213 0 2.1213 2.8284 0 2.8284
  [4,16,1.5308,0,3.6956,1.1481,0,2.7717,2.1213,0,2.1213,2.8284,0,2.8284],
// 4 16 0 0 4 0 0 3 1.1481 0 2.7717 1.5308 0 3.6956
  [4,16,0,0,4,0,0,3,1.1481,0,2.7717,1.5308,0,3.6956],
// 0
];
module ldraw_lib__4_4ring3(step=0, col=false, unit=2/5, alt=false, line=0.2, solid=!$preview)
    makepoly(ldraw_lib__4_4ring3(solid), step=step, col=col, unit=unit, alt=alt, line=line, solid=solid);
ldraw_lib__4_4ring3(line=0.2);
// file: ../p/4-4edge.scad
use <../lib.scad>
$fa=1; $fs=0.2;
function ldraw_lib__4_4edge(realsolid=false) = [
// 0 Circle 1.0
// 0 Name: 4-4edge.dat
// 0 Author: James Jessiman
// 0 !LDRAW_ORG Primitive UPDATE 2017-01
// 0 !LICENSE Licensed under CC BY 2.0 and CC BY 4.0 : see CAreadme.txt
// 
// 0 BFC CERTIFY CCW
  [0,"BFC","CERTIFY"],
  [0,"BFC","CCW"],
// 
// 0 !HISTORY 1998-12-15 [PTadmin] Official Update 1998-10
// 0 !HISTORY 2005-12-28 [PTadmin] Official Update 2005-01
// 0 !HISTORY 2007-06-24 [PTadmin] Header formatted for Contributor Agreement
// 0 !HISTORY 2008-07-01 [PTadmin] Official Update 2008-01
// 0 !HISTORY 2017-01-15 [Steffen] BFCed
// 0 !HISTORY 2017-12-30 [PTadmin] Official Update 2017-01
// 
// 
// 2 24 1 0 0 0.9239 0 0.3827
  [2,24,1,0,0,0.9239,0,0.3827],
// 2 24 0.9239 0 0.3827 0.7071 0 0.7071
  [2,24,0.9239,0,0.3827,0.7071,0,0.7071],
// 2 24 0.7071 0 0.7071 0.3827 0 0.9239
  [2,24,0.7071,0,0.7071,0.3827,0,0.9239],
// 2 24 0.3827 0 0.9239 0 0 1
  [2,24,0.3827,0,0.9239,0,0,1],
// 2 24 0 0 1 -0.3827 0 0.9239
  [2,24,0,0,1,-0.3827,0,0.9239],
// 2 24 -0.3827 0 0.9239 -0.7071 0 0.7071
  [2,24,-0.3827,0,0.9239,-0.7071,0,0.7071],
// 2 24 -0.7071 0 0.7071 -0.9239 0 0.3827
  [2,24,-0.7071,0,0.7071,-0.9239,0,0.3827],
// 2 24 -0.9239 0 0.3827 -1 0 -0
  [2,24,-0.9239,0,0.3827,-1,0,-0],
// 2 24 -1 0 -0 -0.9239 0 -0.3827
  [2,24,-1,0,-0,-0.9239,0,-0.3827],
// 2 24 -0.9239 0 -0.3827 -0.7071 0 -0.7071
  [2,24,-0.9239,0,-0.3827,-0.7071,0,-0.7071],
// 2 24 -0.7071 0 -0.7071 -0.3827 0 -0.9239
  [2,24,-0.7071,0,-0.7071,-0.3827,0,-0.9239],
// 2 24 -0.3827 0 -0.9239 0 0 -1
  [2,24,-0.3827,0,-0.9239,0,0,-1],
// 2 24 0 0 -1 0.3827 0 -0.9239
  [2,24,0,0,-1,0.3827,0,-0.9239],
// 2 24 0.3827 0 -0.9239 0.7071 0 -0.7071
  [2,24,0.3827,0,-0.9239,0.7071,0,-0.7071],
// 2 24 0.7071 0 -0.7071 0.9239 0 -0.3827
  [2,24,0.7071,0,-0.7071,0.9239,0,-0.3827],
// 2 24 0.9239 0 -0.3827 1 0 0
  [2,24,0.9239,0,-0.3827,1,0,0],
];
module ldraw_lib__4_4edge(step=0, col=false, unit=2/5, alt=false, line=0.2, solid=!$preview)
    makepoly(ldraw_lib__4_4edge(solid), step=step, col=col, unit=unit, alt=alt, line=line, solid=solid);
ldraw_lib__4_4edge(line=0.2);
// file: 3004.scad
use <../lib.scad>
use <s/3004s01.scad>
$fa=1; $fs=0.2;
function ldraw_lib__3004(realsolid=false) = [
// 0 Brick  1 x  2
// 0 Name: 3004.dat
// 0 Author: James Jessiman
// 0 !LDRAW_ORG Part UPDATE 2022-05
// 0 !LICENSE Licensed under CC BY 2.0 and CC BY 4.0 : see CAreadme.txt
// 
// 0 BFC CERTIFY CCW
  [0,"BFC","CERTIFY"],
  [0,"BFC","CCW"],
// 
// 0 !HISTORY 2001-10-26 [PTadmin] Official Update 2001-01
// 0 !HISTORY 2002-05-07 {unknown} BFC Certification
// 0 !HISTORY 2002-06-11 [PTadmin] Official Update 2002-03
// 0 !HISTORY 2007-05-07 [PTadmin] Header formatted for Contributor Agreement
// 0 !HISTORY 2008-07-01 [PTadmin] Official Update 2008-01
// 0 !HISTORY 2022-08-04 [MagFors] Using subfile
// 0 !HISTORY 2022-09-15 [PTadmin] Official Update 2022-05
// 
// 
// 1 16 0 0 0 1 0 0 0 1 0 0 0 1 s\3004s01.dat
  [1,16,0,0,0,1,0,0,0,1,0,0,0,1, ldraw_lib__s__3004s01(realsolid)],
// 4 16 -20 24 -10 20 24 -10 20 0 -10 -20 0 -10
  [4,16,-20,24,-10,20,24,-10,20,0,-10,-20,0,-10],
];
module ldraw_lib__3004(step=0, col=false, unit=2/5, alt=false, line=0.2, solid=!$preview)
    makepoly(ldraw_lib__3004(solid), step=step, col=col, unit=unit, alt=alt, line=line, solid=solid);
ldraw_lib__3004(line=0.2);
// file: 71533k03.scad
use <../lib.scad>
use <../p/4-4cyli.scad>
$fa=1; $fs=0.2;
function ldraw_lib__71533k03(realsolid=false) = [
// 0 ~Technic Pneumatic Tube Segment
// 0 Name: 71533k03.dat
// 0 Author: Jaco van der Molen [Jaco]
// 0 !LDRAW_ORG Part Flexible_Section UPDATE 2020-01
// 0 !LICENSE Licensed under CC BY 2.0 and CC BY 4.0 : see CAreadme.txt
// 
// 0 BFC CERTIFY CW
  [0,"BFC","CERTIFY"],
  [0,"BFC","CW"],
// 
// 0 !HISTORY 2003-11-30 [Steffen] BFCed
// 0 !HISTORY 2009-12-29 [PTadmin] Official Update 2009-03
// 0 !HISTORY 2020-06-27 [PTadmin] Renamed from 166
// 0 !HISTORY 2020-06-28 [PTadmin] Official Update 2020-01
// 
// 
// 1 16 0 0 0 5 0 0 0 1 0 0 0 5 4-4cyli.dat
  [1,16,0,0,0,5,0,0,0,1,0,0,0,5, ldraw_lib__4_4cyli(realsolid)],
// 0 BFC INVERTNEXT
  [0,"BFC","INVERTNEXT"],
// 1 16 0 0 0 3 0 0 0 1 0 0 0 3 4-4cyli.dat
  [1,16,0,0,0,3,0,0,0,1,0,0,0,3, ldraw_lib__4_4cyli(realsolid)],
// 0
];
module ldraw_lib__71533k03(step=0, col=false, unit=2/5, alt=false, line=0.2, solid=!$preview)
    makepoly(ldraw_lib__71533k03(solid), step=step, col=col, unit=unit, alt=alt, line=line, solid=solid);
ldraw_lib__71533k03(line=0.2);
// file: 71533k02.scad
use <../lib.scad>
use <../p/4-4edge.scad>
use <../p/4-4ring3.scad>
use <../p/4-4ring4.scad>
$fa=1; $fs=0.2;
function ldraw_lib__71533k02(realsolid=false) = [
// 0 ~Technic Pneumatic Tube End (Non-Bulged)
// 0 Name: 71533k02.dat
// 0 Author: Steffen [Steffen]
// 0 !LDRAW_ORG Part Flexible_Section UPDATE 2020-01
// 0 !LICENSE Licensed under CC BY 2.0 and CC BY 4.0 : see CAreadme.txt
// 
// 0 BFC CERTIFY CCW
  [0,"BFC","CERTIFY"],
  [0,"BFC","CCW"],
// 
// 0 !HISTORY 2020-06-28 [PTadmin] Official Update 2020-01
// 
// 
// 0 // This file goes together with 71533k01.dat and 71533k03.dat.
// 0 // Those 3 files can be used to create Technic Pneumatic Tubes
// 0 // with either bulged or non-bulged ends.
// 
// 1 16 0 0 0 1 0 0 0 1 0 0 0 1 4-4ring3.dat
  [1,16,0,0,0,1,0,0,0,1,0,0,0,1, ldraw_lib__4_4ring3(realsolid)],
// 1 16 0 0 0 1 0 0 0 1 0 0 0 1 4-4ring4.dat
  [1,16,0,0,0,1,0,0,0,1,0,0,0,1, ldraw_lib__4_4ring4(realsolid)],
// 1 16 0 0 0 3 0 0 0 3 0 0 0 3 4-4edge.dat
  [1,16,0,0,0,3,0,0,0,3,0,0,0,3, ldraw_lib__4_4edge(realsolid)],
// 1 16 0 0 0 5 0 0 0 5 0 0 0 5 4-4edge.dat
  [1,16,0,0,0,5,0,0,0,5,0,0,0,5, ldraw_lib__4_4edge(realsolid)],
];
module ldraw_lib__71533k02(step=0, col=false, unit=2/5, alt=false, line=0.2, solid=!$preview)
    makepoly(ldraw_lib__71533k02(solid), step=step, col=col, unit=unit, alt=alt, line=line, solid=solid);
ldraw_lib__71533k02(line=0.2);
// main file
use <../lib.scad>
use <71533k02.scad>
use <71533k03.scad>
$fa=1; $fs=0.2;
function ldraw_lib__14657_f1(realsolid=false) = [
// 0 Technic Pneumatic Tube  7L
// 0 Name: 14657-f1.dat
// 0 Author: Philippe Hurbain [Philo]
// 0 !LDRAW_ORG Part UPDATE 2020-01
// 0 !LICENSE Licensed under CC BY 2.0 and CC BY 4.0 : see CAreadme.txt
// 
// 0 BFC CERTIFY CCW
  [0,"BFC","CERTIFY"],
  [0,"BFC","CCW"],
// 
// 0 !KEYWORDS 56 mm
// 
// 0 !HISTORY 2020-06-28 [PTadmin] Official Update 2020-01
// 
// 
// 1 16 -70 0 0 0 1 0 1 0 0 0 0 1 71533k02.dat
  [1,16,-70,0,0,0,1,0,1,0,0,0,0,1, ldraw_lib__71533k02(realsolid)],
// 1 16 70 0 0 0 -1 0 -1 0 0 0 0 1 71533k02.dat
  [1,16,70,0,0,0,-1,0,-1,0,0,0,0,1, ldraw_lib__71533k02(realsolid)],
// 1 16 -70 0 0 0 140 0 1 0 0 0 0 1 71533k03.dat
  [1,16,-70,0,0,0,140,0,1,0,0,0,0,1, ldraw_lib__71533k03(realsolid)],
];
module ldraw_lib__14657_f1(step=0, col=false, unit=2/5, alt=false, line=0.2, solid=!$preview)
    makepoly(ldraw_lib__14657_f1(solid), step=step, col=col, unit=unit, alt=alt, line=line, solid=solid);
ldraw_lib__14657_f1(line=0.2);
